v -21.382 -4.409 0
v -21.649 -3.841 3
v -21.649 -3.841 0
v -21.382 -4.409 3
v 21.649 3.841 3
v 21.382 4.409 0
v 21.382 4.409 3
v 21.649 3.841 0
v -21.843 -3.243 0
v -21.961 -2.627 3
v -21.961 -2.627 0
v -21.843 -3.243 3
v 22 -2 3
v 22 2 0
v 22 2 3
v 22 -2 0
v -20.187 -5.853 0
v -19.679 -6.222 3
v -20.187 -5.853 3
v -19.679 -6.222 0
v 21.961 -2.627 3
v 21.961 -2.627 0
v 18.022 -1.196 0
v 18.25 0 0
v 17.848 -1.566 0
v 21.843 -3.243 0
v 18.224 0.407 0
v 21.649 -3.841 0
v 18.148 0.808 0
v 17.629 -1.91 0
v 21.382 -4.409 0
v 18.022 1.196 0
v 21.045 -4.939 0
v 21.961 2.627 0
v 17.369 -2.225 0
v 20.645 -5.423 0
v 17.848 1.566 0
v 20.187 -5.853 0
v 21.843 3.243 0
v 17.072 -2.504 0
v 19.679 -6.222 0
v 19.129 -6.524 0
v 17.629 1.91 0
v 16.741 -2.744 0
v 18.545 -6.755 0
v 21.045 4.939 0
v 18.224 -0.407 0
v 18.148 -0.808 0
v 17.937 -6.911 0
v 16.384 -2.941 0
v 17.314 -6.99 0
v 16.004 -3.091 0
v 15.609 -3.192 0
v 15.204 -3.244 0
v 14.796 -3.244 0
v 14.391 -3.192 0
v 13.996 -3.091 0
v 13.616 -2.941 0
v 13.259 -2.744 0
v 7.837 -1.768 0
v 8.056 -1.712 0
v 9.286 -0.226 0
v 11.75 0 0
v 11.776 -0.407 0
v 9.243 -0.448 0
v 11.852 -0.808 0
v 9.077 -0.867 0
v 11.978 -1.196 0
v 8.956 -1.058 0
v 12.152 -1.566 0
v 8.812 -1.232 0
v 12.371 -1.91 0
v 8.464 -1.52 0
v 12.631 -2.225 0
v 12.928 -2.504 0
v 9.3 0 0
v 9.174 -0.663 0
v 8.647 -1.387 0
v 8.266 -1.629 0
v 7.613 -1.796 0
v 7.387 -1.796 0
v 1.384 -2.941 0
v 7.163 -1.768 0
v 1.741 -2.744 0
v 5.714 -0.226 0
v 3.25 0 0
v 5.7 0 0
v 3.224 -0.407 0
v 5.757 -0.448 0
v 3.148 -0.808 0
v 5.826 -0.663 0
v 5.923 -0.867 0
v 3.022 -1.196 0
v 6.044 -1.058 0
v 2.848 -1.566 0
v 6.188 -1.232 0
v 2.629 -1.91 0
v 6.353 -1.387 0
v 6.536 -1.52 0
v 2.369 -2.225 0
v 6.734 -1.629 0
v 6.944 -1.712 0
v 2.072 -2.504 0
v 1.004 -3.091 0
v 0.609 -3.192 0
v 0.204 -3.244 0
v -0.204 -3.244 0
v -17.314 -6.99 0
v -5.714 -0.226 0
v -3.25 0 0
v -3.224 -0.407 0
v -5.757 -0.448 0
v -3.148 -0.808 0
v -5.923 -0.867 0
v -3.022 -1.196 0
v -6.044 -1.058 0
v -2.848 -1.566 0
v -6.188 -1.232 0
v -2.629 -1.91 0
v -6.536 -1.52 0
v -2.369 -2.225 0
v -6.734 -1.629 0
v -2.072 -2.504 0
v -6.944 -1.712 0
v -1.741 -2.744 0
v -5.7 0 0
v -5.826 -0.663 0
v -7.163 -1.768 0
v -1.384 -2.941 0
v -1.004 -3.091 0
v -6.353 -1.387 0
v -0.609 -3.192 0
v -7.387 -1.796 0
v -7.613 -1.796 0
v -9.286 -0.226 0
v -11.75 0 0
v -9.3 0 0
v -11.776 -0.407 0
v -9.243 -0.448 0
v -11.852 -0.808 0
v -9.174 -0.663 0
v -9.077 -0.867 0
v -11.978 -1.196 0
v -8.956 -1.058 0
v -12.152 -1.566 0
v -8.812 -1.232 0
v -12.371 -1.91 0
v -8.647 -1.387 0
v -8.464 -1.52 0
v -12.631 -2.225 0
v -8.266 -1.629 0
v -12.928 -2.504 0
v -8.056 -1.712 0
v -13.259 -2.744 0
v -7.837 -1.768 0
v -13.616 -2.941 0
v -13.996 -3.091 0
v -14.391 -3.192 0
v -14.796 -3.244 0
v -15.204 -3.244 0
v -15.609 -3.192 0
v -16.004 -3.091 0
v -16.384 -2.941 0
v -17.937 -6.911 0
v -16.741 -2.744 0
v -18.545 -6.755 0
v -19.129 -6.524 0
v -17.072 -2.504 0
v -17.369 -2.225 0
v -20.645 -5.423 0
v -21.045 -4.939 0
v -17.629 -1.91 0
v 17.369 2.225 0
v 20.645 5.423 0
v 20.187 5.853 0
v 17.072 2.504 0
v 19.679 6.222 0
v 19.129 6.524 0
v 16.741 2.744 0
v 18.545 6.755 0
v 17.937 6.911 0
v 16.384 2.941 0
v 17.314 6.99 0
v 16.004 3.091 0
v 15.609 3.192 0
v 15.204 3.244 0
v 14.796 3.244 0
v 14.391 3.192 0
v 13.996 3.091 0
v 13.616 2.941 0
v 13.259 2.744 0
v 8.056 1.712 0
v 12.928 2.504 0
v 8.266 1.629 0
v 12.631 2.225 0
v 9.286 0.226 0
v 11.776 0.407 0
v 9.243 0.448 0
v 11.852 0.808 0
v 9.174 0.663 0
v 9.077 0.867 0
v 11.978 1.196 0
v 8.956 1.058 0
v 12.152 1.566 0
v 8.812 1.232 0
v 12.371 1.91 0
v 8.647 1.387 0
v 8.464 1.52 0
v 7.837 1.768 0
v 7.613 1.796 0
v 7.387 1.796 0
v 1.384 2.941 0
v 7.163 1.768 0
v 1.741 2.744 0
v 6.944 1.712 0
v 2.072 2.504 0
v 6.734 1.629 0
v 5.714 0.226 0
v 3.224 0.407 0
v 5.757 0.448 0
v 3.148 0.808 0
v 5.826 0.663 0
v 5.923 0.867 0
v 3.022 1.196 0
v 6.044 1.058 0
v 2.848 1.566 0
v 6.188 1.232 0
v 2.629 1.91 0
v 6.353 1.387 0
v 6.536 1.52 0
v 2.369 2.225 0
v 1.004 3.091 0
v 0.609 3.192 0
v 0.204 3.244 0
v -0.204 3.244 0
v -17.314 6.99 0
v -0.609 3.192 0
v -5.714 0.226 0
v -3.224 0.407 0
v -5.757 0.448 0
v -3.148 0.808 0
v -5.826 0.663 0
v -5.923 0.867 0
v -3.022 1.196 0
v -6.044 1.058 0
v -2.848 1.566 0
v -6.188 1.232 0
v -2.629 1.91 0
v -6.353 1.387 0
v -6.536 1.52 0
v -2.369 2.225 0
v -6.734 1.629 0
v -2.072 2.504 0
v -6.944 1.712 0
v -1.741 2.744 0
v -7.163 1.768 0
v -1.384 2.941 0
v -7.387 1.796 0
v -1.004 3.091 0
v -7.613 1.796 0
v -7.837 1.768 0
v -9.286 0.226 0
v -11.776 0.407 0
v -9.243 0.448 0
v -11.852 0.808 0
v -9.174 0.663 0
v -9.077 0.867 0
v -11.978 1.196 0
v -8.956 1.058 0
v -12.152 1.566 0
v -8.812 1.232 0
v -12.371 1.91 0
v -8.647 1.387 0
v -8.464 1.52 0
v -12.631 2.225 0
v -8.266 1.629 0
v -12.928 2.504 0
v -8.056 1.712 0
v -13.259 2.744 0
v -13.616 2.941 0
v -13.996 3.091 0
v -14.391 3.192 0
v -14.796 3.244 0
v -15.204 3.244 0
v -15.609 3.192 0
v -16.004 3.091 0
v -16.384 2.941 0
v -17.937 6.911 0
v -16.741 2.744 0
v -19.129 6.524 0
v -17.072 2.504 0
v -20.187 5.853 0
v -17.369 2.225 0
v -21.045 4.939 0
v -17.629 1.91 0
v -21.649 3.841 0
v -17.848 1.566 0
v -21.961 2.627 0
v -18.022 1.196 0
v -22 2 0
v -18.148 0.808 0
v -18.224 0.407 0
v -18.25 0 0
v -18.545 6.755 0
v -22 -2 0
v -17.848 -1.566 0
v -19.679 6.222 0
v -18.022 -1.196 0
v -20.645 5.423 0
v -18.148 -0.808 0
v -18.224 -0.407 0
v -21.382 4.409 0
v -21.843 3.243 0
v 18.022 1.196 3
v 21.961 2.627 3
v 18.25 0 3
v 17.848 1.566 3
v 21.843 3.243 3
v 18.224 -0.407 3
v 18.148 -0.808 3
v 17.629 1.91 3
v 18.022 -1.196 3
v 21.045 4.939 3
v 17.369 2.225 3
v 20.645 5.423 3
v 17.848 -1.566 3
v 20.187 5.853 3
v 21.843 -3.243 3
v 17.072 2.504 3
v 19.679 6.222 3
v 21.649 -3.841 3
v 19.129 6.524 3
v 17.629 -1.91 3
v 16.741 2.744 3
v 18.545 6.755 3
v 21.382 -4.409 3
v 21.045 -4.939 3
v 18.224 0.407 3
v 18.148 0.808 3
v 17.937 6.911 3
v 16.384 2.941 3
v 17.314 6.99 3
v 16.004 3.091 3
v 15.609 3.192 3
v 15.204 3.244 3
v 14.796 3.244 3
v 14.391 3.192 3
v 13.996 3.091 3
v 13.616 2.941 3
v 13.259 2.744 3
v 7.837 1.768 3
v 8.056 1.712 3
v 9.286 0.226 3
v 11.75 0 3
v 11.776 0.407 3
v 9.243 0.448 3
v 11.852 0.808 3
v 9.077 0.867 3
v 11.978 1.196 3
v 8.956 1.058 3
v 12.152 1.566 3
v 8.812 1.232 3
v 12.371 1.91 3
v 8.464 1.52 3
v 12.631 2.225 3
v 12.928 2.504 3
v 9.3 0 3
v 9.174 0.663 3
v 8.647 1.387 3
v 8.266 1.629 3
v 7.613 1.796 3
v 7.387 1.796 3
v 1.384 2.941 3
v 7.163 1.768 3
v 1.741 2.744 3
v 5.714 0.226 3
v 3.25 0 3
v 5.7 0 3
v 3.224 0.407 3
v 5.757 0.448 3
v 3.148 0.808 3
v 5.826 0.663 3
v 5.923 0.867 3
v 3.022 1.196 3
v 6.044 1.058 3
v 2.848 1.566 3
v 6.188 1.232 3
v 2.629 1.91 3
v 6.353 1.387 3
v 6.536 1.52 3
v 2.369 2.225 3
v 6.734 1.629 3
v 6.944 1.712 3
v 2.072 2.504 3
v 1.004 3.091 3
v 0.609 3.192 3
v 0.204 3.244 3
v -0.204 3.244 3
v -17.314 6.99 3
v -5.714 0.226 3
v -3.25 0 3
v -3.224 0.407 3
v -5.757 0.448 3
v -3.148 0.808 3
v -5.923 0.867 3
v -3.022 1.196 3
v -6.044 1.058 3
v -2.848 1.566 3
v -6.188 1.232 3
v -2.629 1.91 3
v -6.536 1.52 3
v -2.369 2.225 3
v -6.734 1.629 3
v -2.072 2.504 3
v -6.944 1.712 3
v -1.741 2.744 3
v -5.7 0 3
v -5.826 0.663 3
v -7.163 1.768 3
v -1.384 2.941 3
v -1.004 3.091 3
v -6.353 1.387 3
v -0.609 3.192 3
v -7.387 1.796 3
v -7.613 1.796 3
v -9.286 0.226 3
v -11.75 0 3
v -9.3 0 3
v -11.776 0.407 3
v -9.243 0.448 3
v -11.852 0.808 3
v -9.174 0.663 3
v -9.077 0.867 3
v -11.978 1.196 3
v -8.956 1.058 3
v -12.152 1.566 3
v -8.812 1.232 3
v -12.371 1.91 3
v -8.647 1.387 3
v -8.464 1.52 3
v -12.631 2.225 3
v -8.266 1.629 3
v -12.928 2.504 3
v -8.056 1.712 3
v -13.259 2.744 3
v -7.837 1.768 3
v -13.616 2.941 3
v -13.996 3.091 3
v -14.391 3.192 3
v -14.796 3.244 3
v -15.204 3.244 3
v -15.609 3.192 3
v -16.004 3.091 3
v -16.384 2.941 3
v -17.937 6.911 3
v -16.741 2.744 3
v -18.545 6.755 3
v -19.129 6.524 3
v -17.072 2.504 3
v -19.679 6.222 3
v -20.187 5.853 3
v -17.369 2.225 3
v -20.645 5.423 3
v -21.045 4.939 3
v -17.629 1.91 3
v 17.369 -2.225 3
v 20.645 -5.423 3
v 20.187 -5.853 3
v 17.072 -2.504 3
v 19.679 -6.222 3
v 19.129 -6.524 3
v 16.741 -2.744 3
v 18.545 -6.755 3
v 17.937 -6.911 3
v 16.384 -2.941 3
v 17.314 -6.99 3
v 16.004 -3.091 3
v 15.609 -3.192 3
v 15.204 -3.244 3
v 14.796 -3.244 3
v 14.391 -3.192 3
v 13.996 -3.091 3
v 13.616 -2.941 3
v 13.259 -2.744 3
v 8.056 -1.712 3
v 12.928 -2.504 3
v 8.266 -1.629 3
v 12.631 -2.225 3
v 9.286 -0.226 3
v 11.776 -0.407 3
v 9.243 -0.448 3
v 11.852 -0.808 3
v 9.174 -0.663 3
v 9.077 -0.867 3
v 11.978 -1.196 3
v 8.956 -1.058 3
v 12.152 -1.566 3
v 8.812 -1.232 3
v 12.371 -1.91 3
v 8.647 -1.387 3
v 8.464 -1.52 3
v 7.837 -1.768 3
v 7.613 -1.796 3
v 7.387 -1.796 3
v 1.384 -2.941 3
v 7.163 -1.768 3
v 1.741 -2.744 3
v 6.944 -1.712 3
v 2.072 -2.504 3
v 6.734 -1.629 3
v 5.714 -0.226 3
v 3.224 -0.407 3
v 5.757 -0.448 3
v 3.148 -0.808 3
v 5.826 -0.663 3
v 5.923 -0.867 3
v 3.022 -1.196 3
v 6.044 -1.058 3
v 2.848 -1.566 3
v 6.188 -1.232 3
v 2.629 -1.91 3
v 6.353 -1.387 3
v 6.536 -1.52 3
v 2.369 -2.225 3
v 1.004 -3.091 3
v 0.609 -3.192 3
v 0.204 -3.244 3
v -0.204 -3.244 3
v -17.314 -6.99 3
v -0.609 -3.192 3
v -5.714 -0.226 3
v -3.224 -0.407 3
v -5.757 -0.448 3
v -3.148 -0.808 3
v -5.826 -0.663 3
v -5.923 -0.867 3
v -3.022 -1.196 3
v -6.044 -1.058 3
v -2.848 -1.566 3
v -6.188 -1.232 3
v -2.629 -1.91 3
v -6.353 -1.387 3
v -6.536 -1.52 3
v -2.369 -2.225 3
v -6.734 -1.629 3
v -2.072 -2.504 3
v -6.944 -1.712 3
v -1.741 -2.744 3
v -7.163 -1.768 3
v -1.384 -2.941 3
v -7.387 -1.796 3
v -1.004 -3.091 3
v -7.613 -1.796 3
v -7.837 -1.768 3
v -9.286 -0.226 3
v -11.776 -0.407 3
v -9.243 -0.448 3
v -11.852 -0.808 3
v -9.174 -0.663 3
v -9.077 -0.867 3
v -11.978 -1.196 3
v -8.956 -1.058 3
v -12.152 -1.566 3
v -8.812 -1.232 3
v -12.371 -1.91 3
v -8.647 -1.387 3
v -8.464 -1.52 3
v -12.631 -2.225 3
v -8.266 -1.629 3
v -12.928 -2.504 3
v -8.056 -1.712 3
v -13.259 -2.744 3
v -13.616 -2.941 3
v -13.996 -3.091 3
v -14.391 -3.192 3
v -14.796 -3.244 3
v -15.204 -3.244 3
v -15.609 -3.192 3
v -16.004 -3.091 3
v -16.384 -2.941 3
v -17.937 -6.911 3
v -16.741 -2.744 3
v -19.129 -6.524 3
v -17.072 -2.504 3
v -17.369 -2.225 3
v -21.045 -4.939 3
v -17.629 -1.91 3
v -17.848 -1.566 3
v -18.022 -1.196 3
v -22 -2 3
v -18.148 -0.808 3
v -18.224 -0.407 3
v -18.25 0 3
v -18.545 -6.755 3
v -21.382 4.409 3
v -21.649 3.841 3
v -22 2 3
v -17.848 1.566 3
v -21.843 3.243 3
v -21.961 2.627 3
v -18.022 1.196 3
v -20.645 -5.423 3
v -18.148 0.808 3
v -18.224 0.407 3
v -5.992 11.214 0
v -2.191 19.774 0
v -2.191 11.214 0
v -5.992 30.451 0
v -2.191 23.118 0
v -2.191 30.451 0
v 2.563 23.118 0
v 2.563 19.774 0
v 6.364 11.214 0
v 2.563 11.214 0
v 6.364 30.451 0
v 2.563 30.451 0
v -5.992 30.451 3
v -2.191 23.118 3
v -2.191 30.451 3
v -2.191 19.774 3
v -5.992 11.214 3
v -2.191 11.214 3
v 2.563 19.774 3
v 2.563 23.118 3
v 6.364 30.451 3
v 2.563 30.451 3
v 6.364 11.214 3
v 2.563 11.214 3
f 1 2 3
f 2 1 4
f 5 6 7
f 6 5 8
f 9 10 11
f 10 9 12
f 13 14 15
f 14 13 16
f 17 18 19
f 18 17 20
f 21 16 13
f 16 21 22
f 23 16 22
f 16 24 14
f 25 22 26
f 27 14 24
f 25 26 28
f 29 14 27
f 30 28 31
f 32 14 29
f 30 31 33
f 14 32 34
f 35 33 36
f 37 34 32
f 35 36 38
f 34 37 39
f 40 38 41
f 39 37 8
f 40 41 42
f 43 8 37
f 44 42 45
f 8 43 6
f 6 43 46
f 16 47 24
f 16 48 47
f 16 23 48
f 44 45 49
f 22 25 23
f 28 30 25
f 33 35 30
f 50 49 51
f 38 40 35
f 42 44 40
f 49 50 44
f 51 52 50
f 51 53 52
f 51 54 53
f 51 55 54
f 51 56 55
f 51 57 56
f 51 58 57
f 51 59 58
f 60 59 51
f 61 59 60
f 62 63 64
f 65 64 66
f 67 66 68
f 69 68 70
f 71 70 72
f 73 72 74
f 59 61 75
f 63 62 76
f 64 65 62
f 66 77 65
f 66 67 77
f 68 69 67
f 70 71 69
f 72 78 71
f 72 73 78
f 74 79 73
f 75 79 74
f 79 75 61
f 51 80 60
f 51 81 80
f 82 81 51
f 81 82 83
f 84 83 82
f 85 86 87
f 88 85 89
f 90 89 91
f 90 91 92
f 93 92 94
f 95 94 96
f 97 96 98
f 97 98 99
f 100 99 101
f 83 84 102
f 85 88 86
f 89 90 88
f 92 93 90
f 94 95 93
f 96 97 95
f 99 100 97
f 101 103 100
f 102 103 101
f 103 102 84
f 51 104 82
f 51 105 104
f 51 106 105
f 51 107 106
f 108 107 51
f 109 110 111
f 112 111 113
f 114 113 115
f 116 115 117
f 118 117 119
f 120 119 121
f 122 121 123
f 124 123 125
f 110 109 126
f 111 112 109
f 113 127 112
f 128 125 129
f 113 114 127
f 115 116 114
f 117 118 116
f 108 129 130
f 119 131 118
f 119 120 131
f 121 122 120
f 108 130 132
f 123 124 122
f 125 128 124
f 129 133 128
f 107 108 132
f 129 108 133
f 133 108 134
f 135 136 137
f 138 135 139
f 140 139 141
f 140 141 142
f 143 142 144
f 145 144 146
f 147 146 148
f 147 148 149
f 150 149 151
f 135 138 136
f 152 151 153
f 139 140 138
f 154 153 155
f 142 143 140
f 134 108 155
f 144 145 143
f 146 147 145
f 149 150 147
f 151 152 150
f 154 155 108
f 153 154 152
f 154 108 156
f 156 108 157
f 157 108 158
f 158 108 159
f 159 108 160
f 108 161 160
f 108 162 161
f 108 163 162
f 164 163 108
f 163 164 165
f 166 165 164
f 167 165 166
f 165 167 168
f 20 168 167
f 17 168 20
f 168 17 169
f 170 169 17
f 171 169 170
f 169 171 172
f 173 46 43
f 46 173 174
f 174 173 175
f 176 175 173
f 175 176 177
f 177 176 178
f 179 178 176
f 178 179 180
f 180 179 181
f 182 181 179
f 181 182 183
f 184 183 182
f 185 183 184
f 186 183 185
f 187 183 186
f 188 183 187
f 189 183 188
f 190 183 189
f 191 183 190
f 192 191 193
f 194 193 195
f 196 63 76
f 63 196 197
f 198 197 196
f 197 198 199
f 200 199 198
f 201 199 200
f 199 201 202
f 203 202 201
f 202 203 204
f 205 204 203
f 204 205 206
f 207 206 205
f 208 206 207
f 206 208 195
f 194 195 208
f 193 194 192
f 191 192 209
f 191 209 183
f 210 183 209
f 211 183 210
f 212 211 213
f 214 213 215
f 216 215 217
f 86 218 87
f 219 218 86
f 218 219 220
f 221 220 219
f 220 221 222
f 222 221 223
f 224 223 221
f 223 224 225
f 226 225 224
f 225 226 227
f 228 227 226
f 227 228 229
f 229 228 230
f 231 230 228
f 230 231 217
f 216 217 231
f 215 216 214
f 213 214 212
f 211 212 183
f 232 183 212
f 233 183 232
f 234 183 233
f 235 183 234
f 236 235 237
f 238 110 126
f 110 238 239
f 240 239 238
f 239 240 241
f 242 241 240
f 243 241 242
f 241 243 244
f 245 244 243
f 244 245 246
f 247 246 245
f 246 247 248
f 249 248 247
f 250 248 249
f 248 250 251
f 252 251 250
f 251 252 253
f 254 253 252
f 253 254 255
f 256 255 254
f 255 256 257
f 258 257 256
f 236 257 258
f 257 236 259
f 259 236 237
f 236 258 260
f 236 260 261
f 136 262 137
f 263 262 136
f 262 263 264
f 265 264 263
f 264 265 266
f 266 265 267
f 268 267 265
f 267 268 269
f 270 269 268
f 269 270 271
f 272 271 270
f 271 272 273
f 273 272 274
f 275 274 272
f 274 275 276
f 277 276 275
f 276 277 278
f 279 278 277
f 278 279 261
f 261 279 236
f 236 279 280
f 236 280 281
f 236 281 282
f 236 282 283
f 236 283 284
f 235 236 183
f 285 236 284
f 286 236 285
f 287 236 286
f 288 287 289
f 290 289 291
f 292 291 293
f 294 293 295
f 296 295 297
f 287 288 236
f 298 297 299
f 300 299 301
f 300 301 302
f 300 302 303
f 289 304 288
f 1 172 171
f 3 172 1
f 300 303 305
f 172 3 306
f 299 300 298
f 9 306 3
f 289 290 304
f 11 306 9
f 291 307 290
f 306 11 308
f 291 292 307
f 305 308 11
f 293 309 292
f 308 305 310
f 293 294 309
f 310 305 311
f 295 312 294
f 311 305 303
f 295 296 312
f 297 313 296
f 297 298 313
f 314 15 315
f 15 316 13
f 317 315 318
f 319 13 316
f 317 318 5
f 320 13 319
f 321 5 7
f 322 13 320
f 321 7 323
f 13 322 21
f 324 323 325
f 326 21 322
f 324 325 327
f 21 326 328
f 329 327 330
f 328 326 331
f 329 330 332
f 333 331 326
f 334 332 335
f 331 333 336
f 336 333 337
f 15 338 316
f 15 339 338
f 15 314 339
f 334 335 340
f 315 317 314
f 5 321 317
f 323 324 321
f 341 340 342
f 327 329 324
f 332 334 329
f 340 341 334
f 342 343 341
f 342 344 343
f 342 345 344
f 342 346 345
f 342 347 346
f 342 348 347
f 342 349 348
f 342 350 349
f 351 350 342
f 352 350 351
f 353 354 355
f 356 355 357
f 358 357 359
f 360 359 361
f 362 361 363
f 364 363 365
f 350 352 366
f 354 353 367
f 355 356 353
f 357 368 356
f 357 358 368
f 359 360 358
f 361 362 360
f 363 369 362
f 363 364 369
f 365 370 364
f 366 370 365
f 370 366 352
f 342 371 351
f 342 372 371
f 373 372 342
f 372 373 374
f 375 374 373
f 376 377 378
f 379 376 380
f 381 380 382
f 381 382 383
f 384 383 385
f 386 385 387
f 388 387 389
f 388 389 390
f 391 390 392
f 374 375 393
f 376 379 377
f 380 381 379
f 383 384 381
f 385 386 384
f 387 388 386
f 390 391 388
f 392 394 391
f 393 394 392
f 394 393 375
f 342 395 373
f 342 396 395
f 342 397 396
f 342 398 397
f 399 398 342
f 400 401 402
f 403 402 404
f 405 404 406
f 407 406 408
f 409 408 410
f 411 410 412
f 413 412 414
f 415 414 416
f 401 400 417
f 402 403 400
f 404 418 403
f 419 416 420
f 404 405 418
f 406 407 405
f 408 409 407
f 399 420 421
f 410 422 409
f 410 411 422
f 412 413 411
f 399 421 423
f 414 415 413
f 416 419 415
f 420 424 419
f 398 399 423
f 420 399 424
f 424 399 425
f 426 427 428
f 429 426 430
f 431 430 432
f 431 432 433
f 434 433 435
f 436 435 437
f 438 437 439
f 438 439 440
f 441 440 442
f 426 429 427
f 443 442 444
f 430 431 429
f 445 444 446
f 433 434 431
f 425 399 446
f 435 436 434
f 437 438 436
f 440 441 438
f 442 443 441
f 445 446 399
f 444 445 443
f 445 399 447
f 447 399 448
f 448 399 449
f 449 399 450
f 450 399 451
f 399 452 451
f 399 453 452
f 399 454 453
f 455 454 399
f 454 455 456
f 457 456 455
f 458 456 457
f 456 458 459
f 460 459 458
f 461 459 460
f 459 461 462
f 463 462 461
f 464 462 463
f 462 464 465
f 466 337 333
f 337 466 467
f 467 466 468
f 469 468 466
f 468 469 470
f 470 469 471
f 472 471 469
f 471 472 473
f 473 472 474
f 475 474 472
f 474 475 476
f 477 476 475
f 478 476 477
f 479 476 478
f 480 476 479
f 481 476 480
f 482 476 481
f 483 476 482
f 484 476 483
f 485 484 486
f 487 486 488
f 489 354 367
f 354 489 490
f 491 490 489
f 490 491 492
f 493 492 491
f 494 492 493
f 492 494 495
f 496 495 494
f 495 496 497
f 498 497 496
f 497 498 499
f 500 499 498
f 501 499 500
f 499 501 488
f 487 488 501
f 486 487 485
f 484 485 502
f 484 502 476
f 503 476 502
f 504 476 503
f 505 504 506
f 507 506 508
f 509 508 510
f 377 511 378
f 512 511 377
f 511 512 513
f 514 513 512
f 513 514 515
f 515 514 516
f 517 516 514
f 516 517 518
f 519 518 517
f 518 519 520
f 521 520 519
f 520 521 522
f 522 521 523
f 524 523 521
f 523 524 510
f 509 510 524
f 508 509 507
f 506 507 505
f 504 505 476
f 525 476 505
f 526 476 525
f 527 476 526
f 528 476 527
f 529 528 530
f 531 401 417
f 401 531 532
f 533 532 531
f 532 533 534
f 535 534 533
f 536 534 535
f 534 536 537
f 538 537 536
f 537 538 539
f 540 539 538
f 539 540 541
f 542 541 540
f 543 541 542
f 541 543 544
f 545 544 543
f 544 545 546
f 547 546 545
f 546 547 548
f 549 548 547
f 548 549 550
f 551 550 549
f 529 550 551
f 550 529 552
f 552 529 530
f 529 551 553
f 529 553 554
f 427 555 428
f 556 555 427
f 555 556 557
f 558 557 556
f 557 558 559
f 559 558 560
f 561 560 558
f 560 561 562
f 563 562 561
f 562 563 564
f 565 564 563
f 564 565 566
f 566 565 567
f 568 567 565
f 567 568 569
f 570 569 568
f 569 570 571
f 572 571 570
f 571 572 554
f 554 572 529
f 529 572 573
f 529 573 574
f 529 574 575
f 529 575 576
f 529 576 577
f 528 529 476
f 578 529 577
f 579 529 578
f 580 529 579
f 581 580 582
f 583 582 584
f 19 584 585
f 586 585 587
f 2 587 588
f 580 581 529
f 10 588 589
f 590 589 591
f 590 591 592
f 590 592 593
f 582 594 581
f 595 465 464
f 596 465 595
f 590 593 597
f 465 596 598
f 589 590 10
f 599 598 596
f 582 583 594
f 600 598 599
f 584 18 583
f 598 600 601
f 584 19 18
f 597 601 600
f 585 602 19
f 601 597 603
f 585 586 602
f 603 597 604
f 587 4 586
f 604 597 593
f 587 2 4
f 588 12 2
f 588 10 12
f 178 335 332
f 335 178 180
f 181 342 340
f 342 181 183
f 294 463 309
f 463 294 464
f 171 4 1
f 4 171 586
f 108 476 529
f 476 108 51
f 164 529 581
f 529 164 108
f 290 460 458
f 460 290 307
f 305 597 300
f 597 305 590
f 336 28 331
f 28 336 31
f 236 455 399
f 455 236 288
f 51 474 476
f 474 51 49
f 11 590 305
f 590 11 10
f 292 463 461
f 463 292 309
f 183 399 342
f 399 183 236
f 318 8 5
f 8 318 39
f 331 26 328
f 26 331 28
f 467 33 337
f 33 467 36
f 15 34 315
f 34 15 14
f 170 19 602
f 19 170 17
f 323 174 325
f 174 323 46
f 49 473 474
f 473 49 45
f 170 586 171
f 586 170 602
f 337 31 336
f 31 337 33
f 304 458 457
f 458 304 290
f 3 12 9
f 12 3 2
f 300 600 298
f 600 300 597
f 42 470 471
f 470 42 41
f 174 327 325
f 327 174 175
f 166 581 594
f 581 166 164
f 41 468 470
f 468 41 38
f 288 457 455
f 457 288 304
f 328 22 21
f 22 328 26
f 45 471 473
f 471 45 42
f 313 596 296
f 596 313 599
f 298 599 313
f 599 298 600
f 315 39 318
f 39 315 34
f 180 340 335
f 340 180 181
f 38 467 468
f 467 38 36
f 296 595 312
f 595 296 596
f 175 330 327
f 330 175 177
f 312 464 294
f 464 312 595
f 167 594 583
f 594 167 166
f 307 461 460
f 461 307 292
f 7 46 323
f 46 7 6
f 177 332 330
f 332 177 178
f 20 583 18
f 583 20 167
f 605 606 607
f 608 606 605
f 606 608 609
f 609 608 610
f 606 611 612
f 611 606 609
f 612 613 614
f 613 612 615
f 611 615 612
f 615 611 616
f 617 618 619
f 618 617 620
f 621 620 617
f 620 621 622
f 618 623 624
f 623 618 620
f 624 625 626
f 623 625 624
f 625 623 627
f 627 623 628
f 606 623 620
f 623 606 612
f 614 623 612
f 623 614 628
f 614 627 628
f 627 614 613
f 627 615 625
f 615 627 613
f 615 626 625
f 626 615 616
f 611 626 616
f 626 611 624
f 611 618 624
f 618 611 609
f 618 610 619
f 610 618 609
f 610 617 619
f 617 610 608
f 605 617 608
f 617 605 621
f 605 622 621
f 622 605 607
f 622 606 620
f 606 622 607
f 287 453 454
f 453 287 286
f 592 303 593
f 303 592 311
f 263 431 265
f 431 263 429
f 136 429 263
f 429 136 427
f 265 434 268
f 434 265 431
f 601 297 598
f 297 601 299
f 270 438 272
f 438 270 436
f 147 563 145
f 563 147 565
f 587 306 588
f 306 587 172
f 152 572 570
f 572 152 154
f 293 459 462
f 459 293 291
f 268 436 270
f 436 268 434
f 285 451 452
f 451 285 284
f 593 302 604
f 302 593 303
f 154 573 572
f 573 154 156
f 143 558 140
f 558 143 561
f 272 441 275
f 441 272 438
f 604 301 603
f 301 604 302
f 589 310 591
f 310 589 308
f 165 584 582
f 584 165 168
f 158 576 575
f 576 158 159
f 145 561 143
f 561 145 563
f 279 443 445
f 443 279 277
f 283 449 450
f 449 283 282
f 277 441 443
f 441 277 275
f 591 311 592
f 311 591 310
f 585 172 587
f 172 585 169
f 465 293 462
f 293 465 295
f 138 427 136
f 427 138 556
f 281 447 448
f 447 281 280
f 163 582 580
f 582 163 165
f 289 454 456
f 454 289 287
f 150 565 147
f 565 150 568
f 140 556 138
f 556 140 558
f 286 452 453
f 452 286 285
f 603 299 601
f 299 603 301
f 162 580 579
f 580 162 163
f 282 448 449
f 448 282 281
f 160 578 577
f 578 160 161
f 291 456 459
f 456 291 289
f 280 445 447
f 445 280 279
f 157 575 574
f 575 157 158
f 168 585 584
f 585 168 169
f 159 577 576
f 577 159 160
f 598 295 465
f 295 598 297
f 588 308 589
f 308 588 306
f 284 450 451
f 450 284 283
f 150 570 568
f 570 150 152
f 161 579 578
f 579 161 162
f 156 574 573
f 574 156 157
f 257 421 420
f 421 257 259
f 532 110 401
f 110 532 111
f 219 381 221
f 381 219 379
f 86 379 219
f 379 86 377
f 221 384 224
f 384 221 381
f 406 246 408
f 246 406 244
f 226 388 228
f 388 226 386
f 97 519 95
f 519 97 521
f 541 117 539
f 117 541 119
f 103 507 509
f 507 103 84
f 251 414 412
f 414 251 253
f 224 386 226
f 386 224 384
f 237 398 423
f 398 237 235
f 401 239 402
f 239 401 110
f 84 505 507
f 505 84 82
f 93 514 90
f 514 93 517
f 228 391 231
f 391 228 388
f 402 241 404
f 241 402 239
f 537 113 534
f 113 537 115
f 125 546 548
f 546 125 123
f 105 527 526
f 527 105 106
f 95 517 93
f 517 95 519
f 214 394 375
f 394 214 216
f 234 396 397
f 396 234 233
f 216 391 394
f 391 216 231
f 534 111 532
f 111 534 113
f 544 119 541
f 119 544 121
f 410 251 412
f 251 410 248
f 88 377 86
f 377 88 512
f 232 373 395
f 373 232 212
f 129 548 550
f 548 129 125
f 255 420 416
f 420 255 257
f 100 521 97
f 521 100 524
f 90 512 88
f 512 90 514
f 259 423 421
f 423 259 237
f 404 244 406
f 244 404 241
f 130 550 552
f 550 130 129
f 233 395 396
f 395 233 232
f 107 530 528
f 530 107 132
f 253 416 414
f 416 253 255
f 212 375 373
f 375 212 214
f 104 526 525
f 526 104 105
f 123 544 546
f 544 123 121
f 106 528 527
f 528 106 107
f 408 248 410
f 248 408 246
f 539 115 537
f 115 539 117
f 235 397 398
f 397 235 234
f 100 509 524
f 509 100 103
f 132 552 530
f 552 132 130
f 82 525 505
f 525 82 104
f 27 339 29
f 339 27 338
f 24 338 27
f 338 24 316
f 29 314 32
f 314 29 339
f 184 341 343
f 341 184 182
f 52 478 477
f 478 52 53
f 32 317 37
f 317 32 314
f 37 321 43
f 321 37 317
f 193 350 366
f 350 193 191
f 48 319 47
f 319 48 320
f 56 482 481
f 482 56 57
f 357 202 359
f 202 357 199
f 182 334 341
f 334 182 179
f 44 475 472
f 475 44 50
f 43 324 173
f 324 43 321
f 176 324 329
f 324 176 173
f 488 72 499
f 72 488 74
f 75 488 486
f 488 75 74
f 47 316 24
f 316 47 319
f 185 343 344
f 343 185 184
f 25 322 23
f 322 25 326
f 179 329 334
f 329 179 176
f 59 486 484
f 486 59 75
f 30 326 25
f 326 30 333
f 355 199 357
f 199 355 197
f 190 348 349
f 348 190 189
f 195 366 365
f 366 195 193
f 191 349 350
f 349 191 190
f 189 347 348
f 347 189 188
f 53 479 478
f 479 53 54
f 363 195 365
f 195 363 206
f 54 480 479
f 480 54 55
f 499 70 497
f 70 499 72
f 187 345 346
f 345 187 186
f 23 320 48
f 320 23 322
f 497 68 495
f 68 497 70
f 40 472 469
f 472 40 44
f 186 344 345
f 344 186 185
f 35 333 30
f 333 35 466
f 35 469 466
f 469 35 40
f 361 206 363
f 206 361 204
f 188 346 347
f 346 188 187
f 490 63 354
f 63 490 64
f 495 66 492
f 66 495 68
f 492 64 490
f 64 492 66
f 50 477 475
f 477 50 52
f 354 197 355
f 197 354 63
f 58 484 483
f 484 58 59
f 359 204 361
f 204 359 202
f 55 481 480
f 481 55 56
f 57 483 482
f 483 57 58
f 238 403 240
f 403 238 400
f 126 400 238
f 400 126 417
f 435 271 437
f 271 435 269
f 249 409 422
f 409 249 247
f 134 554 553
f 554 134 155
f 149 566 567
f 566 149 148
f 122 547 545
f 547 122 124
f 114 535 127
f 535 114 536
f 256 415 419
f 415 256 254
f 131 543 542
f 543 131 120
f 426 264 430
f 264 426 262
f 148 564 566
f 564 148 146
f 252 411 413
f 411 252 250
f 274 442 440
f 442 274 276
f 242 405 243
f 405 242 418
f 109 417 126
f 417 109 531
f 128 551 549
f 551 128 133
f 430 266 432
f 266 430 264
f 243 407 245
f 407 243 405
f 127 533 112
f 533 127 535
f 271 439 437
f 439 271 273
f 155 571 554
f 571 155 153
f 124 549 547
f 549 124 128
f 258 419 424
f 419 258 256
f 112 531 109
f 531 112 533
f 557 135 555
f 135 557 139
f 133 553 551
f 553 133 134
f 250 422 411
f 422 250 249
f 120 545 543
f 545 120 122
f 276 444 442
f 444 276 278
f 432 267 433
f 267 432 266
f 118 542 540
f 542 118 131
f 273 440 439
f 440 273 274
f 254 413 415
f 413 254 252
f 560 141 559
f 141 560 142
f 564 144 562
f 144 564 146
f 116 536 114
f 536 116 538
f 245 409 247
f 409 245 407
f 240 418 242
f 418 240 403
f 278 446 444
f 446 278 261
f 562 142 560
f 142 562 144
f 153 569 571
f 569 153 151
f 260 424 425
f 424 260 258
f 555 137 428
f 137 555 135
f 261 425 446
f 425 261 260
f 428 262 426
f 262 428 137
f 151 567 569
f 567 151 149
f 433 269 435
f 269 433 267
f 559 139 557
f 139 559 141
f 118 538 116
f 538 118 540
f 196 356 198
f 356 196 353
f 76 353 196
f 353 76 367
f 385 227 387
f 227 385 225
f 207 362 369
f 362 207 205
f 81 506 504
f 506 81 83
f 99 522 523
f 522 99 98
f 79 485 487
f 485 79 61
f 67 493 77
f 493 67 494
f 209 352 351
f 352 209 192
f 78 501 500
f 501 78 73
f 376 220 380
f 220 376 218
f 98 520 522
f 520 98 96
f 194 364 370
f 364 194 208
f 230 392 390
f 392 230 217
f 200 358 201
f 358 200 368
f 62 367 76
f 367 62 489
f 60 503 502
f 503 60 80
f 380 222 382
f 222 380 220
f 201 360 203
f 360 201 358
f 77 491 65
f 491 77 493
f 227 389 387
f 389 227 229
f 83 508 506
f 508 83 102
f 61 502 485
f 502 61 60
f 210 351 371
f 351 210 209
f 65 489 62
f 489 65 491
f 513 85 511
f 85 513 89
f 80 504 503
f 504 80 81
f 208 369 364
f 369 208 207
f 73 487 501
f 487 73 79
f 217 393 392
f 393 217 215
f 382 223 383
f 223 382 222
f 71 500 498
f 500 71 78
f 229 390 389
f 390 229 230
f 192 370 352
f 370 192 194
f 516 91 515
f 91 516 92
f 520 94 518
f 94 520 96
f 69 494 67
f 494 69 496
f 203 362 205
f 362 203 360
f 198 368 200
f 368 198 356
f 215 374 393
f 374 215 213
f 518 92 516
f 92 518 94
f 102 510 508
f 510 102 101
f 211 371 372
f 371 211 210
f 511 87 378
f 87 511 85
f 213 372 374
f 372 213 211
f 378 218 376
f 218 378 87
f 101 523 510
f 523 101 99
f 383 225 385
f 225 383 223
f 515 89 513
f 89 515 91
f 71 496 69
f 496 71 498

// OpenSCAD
$fn = 50;


difference() {
	union() {
		hull() {
			translate(v = [-17.0000000000, 2.0000000000, 0]) {
				cylinder(h = 3, r = 5);
			}
			translate(v = [17.0000000000, 2.0000000000, 0]) {
				cylinder(h = 3, r = 5);
			}
			translate(v = [-17.0000000000, -2.0000000000, 0]) {
				cylinder(h = 3, r = 5);
			}
			translate(v = [17.0000000000, -2.0000000000, 0]) {
				cylinder(h = 3, r = 5);
			}
		}
		translate(v = [0, 30.0000000000, 0]) {
			linear_extrude(height = 3) {
				text(font = "DejaVu Sans Mono:style=Bold", halign = "center", size = 19.0000000000, text = "H", valign = "top");
			}
		}
	}
	union() {
		translate(v = [-15.0000000000, 0.0000000000, 0]) {
			translate(v = [0, 0, -100]) {
				cylinder(h = 200, r = 3.2500000000);
			}
		}
		translate(v = [0, 0, -100]) {
			cylinder(h = 200, r = 3.2500000000);
		}
		translate(v = [15.0000000000, 0.0000000000, 0]) {
			translate(v = [0, 0, -100]) {
				cylinder(h = 200, r = 3.2500000000);
			}
		}
		translate(v = [-15.0000000000, 0.0000000000, 0]) {
			translate(v = [0, 0, -100]) {
				cylinder(h = 200, r = 1.8000000000);
			}
		}
		translate(v = [-7.5000000000, 0.0000000000, 0]) {
			translate(v = [0, 0, -100]) {
				cylinder(h = 200, r = 1.8000000000);
			}
		}
		translate(v = [0, 0, -100]) {
			cylinder(h = 200, r = 1.8000000000);
		}
		translate(v = [7.5000000000, 0.0000000000, 0]) {
			translate(v = [0, 0, -100]) {
				cylinder(h = 200, r = 1.8000000000);
			}
		}
		translate(v = [15.0000000000, 0.0000000000, 0]) {
			translate(v = [0, 0, -100]) {
				cylinder(h = 200, r = 1.8000000000);
			}
		}
	}
}
